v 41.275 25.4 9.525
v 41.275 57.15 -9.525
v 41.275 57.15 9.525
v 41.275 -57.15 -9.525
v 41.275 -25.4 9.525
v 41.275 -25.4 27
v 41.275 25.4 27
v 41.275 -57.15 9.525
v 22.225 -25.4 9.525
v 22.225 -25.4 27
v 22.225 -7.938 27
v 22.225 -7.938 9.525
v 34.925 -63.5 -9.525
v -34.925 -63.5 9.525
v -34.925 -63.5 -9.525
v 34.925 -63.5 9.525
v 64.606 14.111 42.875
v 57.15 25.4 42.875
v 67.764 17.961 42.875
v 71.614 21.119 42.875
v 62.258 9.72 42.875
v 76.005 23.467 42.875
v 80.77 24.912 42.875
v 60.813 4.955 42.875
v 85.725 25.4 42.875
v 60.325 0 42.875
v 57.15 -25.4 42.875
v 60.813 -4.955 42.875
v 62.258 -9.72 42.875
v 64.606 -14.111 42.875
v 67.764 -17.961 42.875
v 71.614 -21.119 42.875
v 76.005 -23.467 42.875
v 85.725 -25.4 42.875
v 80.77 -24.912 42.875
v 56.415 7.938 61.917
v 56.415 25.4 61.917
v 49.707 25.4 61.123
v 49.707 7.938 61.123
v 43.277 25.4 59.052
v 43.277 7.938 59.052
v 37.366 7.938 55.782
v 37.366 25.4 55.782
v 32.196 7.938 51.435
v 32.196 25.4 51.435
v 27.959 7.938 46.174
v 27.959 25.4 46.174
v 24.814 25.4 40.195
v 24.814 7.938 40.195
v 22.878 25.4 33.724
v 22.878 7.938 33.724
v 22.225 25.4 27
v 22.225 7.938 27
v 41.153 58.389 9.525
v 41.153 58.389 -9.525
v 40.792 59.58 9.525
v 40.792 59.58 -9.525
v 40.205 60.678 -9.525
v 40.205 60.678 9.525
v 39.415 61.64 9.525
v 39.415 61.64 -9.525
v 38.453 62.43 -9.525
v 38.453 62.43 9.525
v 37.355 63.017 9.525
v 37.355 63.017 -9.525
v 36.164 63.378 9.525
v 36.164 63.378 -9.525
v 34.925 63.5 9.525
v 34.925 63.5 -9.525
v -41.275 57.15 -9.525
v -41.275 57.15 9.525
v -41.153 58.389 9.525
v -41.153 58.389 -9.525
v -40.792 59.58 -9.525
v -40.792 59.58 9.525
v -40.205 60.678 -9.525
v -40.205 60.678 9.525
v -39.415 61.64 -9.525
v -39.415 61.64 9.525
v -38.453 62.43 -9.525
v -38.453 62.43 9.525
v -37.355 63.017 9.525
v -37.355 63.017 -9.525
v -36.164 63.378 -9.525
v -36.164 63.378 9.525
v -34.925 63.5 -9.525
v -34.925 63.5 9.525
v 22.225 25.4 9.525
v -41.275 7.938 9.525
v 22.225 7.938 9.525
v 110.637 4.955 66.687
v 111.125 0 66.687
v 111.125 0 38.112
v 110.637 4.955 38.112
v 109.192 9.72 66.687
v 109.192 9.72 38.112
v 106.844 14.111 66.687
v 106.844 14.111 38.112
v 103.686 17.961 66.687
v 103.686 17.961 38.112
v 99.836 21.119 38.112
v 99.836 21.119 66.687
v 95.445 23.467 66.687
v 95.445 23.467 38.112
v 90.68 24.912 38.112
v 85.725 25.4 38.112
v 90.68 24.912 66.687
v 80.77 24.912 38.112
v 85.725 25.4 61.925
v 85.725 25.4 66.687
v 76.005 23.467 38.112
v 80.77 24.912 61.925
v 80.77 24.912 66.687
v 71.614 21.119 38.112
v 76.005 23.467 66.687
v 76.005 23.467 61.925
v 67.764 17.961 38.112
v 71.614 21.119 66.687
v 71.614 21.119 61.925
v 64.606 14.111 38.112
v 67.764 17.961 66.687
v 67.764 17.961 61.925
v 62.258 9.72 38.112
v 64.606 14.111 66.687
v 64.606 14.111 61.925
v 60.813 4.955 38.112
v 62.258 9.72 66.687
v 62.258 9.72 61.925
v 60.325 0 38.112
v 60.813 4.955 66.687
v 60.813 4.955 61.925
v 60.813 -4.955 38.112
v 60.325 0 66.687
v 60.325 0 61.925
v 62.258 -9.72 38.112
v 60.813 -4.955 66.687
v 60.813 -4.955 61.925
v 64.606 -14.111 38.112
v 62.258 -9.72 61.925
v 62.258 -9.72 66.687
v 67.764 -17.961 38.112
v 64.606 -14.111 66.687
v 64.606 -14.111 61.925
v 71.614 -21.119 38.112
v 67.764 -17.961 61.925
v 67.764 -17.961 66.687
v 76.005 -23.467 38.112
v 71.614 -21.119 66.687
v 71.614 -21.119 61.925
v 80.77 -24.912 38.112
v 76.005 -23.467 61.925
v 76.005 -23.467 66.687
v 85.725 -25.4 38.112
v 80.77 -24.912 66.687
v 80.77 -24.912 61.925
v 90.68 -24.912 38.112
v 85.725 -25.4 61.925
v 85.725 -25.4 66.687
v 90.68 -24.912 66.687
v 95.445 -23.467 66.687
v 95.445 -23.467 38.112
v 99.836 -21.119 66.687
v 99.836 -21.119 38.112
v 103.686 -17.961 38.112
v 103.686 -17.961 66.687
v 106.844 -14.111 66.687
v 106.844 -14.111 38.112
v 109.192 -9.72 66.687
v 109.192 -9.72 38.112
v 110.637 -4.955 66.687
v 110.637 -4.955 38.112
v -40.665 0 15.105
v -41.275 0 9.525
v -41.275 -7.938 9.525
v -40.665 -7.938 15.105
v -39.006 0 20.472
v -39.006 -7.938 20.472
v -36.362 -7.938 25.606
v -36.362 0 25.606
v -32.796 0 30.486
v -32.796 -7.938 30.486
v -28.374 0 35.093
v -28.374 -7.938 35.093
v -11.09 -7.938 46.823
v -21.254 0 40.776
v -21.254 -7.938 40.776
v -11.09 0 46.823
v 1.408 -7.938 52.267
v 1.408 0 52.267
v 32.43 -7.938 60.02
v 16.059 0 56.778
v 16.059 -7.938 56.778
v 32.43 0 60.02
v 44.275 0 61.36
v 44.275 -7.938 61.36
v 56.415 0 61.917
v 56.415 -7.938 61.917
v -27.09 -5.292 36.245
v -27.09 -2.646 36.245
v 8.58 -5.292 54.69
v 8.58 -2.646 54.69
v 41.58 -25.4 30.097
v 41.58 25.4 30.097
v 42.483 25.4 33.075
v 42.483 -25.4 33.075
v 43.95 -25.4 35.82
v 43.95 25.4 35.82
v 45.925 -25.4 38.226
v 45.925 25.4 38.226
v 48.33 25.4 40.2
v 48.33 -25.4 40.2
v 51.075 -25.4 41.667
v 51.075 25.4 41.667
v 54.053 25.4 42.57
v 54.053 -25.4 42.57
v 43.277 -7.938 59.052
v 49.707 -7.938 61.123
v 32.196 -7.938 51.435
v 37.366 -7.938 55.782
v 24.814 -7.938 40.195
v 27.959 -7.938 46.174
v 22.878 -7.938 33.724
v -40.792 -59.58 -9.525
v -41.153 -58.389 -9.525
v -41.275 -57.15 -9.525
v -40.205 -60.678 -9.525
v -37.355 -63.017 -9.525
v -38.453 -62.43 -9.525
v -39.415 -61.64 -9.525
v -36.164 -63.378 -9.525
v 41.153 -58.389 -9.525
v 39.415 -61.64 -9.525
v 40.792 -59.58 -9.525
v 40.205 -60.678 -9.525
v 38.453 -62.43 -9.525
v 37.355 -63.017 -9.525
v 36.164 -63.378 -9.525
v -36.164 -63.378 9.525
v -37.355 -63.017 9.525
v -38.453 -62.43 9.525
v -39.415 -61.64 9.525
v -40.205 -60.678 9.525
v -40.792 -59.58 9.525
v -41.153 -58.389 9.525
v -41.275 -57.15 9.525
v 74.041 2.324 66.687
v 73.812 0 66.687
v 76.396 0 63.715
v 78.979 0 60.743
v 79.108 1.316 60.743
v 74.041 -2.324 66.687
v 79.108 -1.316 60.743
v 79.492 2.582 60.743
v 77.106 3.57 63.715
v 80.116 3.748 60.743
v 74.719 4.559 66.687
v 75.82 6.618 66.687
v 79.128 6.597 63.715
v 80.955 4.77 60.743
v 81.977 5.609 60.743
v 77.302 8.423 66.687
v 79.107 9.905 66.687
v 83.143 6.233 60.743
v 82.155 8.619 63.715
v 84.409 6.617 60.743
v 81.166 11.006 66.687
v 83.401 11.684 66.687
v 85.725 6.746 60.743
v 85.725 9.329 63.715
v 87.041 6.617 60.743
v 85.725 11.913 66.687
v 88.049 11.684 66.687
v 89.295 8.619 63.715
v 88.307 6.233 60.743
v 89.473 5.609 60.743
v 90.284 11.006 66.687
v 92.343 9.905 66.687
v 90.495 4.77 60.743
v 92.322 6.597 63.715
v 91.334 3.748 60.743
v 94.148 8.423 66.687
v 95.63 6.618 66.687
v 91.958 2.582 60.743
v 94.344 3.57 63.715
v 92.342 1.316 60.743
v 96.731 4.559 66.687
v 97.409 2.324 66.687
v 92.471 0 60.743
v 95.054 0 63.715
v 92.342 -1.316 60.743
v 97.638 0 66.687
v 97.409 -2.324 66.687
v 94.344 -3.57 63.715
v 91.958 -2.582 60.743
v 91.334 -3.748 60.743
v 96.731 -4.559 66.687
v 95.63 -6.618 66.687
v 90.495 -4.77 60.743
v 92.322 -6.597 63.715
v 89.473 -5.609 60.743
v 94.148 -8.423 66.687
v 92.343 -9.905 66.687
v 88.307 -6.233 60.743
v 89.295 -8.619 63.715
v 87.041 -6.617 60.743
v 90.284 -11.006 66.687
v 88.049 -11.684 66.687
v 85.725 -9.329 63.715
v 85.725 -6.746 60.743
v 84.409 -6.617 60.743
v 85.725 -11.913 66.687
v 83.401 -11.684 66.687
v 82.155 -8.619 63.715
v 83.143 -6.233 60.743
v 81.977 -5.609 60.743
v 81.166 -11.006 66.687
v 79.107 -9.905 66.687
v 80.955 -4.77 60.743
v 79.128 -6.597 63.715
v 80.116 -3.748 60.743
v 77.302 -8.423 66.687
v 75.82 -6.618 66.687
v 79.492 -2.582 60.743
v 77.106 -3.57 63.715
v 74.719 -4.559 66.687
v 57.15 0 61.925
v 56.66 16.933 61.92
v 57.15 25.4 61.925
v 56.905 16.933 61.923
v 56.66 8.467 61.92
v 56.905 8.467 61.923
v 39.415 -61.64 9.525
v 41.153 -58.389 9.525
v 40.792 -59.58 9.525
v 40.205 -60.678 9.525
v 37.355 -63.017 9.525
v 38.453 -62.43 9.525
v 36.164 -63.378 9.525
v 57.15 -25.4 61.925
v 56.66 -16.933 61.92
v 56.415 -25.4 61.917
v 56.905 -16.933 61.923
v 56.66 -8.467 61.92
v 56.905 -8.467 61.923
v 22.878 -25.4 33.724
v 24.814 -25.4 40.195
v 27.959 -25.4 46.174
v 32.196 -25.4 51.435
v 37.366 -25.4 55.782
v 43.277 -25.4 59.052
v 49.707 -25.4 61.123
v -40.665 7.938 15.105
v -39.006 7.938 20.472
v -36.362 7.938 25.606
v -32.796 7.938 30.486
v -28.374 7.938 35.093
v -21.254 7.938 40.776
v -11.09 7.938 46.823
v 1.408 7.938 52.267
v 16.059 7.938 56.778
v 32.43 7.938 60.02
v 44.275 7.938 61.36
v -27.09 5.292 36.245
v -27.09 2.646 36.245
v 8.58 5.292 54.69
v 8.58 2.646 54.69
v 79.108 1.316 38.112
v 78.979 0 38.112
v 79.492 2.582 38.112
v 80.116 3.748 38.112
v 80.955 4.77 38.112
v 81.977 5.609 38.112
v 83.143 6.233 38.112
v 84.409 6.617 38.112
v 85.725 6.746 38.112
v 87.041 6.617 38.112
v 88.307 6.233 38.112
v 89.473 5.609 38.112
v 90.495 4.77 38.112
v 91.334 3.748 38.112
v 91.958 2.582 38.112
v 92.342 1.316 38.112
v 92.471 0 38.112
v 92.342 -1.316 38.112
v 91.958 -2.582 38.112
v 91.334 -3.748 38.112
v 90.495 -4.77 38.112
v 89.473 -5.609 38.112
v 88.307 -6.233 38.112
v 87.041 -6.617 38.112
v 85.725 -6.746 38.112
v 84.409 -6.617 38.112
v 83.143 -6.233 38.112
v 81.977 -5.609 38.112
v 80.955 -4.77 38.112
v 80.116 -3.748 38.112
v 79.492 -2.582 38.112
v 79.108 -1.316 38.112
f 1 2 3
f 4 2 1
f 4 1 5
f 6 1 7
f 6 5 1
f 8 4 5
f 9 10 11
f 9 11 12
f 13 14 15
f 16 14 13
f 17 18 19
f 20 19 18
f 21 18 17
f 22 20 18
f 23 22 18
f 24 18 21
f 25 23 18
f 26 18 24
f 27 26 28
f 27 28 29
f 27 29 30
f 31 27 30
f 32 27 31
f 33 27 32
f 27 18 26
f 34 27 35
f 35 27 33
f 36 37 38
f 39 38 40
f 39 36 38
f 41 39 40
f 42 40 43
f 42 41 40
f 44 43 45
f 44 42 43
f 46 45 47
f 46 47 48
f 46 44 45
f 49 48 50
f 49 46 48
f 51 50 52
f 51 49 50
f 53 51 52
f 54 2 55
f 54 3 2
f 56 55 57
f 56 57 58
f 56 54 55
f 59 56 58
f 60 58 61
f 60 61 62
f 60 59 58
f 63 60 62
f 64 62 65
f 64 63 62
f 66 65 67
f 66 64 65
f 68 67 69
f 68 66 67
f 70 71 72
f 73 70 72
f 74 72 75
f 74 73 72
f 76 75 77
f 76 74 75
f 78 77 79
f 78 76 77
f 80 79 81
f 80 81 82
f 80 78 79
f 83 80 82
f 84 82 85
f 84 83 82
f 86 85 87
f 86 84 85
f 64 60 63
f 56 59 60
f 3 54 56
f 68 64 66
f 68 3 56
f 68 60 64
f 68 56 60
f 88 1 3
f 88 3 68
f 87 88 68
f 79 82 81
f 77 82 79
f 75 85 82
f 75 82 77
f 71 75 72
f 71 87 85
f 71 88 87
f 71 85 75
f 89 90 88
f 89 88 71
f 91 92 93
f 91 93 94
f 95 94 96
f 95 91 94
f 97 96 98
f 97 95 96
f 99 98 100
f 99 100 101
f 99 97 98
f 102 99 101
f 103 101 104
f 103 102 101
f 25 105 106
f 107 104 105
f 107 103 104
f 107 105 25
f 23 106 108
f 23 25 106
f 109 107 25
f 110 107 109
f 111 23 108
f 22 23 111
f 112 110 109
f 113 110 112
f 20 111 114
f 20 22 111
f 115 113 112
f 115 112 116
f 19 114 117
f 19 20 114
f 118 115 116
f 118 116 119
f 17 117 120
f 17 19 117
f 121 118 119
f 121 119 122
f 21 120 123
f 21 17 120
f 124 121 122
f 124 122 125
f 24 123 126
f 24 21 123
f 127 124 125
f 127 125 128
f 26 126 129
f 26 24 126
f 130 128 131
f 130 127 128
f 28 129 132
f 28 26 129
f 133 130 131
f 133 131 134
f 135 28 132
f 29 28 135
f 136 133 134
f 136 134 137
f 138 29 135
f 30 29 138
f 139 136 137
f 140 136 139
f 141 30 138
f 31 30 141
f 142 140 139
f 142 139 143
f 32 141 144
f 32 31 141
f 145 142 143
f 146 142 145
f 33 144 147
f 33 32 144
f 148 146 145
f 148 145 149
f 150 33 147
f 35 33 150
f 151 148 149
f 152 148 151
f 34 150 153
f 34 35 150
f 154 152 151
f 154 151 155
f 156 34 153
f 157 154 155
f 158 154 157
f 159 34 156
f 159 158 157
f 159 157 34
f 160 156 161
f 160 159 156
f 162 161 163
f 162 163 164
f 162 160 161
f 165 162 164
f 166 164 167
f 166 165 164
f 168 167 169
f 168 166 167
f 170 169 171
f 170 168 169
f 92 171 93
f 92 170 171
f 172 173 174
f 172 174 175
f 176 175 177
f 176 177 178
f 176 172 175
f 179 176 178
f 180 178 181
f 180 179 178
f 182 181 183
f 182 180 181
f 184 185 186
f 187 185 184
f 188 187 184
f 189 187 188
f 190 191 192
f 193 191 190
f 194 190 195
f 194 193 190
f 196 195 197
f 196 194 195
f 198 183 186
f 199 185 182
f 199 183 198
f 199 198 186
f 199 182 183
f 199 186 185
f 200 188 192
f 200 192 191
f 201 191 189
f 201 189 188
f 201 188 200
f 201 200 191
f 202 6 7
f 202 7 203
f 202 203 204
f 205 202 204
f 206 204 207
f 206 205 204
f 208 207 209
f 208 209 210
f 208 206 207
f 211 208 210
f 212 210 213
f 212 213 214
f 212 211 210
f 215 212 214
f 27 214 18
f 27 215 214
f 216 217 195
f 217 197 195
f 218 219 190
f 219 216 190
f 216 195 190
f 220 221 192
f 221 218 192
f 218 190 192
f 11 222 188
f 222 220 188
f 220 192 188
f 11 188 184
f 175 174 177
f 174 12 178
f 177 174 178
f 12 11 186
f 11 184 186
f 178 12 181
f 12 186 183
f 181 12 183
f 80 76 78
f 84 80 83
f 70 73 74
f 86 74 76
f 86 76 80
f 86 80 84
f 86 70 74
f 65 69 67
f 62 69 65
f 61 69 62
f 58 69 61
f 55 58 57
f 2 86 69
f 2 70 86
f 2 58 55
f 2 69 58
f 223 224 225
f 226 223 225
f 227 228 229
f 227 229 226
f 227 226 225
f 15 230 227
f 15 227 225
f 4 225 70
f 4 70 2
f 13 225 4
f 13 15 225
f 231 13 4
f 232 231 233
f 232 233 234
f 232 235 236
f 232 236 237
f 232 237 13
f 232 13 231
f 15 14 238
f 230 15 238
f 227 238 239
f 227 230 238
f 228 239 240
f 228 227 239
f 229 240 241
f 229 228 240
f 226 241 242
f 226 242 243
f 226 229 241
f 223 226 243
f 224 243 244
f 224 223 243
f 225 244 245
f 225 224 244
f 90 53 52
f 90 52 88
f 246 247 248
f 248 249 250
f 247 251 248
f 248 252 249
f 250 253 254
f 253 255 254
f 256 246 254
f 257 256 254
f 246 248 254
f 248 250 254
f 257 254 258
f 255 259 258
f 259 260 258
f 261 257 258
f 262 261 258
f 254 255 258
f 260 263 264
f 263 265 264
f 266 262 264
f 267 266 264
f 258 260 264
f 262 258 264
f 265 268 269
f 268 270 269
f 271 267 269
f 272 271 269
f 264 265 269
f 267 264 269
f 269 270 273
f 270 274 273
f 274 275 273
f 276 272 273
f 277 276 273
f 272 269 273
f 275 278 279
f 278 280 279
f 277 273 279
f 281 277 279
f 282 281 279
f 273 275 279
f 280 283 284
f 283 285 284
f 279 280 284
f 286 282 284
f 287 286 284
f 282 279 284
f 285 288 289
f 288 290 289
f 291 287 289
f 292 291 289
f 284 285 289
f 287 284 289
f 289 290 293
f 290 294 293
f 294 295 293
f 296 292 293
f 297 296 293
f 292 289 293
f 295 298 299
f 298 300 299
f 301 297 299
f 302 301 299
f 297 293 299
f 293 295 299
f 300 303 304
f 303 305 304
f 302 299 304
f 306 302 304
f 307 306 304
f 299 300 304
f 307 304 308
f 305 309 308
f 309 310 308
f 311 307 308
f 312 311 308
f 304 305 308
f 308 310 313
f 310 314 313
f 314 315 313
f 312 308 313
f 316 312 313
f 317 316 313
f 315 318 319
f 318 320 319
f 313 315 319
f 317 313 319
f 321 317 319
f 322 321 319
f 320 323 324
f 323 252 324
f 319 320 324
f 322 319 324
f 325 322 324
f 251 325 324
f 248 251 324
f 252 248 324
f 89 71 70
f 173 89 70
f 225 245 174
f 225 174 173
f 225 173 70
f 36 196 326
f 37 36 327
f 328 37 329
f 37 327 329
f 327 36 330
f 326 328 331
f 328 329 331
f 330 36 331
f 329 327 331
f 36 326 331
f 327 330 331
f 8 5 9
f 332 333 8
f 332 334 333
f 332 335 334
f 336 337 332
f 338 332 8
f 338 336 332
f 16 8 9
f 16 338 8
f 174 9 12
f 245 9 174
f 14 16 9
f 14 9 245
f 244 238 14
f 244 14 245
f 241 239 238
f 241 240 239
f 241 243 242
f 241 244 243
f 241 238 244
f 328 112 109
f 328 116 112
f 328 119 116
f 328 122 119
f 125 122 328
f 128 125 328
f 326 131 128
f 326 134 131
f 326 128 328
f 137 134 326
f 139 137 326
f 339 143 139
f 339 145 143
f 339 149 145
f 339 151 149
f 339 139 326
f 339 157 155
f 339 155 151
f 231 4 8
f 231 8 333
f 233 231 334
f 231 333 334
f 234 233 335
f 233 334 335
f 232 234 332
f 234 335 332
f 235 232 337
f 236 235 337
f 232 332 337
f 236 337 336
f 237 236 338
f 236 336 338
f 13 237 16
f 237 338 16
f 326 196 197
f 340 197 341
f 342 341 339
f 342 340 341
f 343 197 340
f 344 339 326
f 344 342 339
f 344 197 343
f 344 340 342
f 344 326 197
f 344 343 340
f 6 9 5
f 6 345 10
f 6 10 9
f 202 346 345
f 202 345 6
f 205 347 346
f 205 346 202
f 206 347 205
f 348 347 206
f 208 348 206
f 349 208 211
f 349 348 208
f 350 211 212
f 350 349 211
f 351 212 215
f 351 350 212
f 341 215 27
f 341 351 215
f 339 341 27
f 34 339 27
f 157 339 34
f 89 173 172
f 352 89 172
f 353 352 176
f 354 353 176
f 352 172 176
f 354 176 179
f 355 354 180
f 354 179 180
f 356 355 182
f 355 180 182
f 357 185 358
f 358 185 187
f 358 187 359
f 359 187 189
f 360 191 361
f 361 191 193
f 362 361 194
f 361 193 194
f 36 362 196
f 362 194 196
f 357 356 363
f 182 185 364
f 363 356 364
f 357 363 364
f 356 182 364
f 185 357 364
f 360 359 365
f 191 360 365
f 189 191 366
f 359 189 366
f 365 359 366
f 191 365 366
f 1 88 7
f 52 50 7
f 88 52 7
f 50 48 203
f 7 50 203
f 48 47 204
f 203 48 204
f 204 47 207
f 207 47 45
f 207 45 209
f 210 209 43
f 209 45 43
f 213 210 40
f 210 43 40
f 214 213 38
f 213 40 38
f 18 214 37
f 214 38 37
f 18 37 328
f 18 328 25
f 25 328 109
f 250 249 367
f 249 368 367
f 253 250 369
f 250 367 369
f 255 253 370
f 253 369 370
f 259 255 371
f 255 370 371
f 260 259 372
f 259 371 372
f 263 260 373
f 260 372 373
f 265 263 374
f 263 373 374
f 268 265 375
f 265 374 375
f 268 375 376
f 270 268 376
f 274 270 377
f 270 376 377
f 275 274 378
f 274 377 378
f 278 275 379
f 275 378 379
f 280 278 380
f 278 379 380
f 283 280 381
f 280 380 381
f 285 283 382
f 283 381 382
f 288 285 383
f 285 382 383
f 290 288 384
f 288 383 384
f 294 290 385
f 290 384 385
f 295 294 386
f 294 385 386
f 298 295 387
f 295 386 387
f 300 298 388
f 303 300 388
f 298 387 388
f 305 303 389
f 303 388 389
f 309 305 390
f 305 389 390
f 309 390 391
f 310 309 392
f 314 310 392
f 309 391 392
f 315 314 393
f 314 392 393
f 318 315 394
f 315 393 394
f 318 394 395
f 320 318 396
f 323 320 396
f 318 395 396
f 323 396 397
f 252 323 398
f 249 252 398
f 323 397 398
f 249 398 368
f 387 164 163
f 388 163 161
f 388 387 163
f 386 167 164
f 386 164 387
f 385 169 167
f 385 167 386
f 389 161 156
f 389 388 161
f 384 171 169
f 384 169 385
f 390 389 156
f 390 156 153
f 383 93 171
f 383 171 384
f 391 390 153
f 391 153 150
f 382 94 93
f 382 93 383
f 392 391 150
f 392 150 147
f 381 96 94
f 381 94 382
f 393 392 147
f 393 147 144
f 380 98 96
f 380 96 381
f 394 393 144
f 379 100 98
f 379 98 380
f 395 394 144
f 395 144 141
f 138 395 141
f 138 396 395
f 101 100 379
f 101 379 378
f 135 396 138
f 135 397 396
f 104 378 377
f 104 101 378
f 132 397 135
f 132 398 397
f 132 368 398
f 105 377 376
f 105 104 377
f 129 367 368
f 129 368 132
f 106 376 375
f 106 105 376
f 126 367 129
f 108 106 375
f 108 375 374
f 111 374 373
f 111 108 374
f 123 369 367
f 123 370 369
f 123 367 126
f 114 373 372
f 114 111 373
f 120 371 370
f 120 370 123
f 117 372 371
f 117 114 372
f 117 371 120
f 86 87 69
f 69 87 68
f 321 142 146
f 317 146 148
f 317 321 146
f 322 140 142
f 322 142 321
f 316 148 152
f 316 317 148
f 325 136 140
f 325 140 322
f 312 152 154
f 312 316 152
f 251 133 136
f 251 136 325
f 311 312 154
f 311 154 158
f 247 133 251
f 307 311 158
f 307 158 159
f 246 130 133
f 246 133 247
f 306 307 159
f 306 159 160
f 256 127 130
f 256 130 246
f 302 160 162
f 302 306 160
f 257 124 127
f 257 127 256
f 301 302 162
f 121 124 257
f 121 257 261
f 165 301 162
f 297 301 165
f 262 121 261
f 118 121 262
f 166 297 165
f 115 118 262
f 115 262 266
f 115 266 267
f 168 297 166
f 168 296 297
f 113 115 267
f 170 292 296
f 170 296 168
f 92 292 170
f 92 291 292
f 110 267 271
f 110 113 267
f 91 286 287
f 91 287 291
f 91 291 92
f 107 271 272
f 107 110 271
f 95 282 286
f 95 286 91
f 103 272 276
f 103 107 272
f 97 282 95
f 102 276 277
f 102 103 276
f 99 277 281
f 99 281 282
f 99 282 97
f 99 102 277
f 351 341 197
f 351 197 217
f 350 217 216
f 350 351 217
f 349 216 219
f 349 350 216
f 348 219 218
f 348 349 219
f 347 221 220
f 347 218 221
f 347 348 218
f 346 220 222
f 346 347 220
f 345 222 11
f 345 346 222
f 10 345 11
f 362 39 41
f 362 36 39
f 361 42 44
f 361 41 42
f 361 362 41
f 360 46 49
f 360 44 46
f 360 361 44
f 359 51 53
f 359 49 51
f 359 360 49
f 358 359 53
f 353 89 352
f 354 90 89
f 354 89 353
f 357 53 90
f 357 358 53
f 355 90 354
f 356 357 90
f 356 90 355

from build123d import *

# Parameters (mm, degrees)
F1_DEPTH       = 63.5
F0_W           = 25.4
F0_H           = 19.05
F2_DEPTH       = 25.4
F3_DEPTH       = 7.9375
F5_R           = 6.35
F7_D           = 13.49248
F7_CSINK_D     = 23.8252
F7_CSINK_ANGLE = 82


with BuildPart() as f1:
    # F0 (on Front) → F1 (new body, symmetric)
    with BuildSketch(Plane.XZ):
        Polygon((-41.275, 9.525), (-41.275, -9.525), (41.275, -9.525), (41.275, 9.525), (22.225, 9.525), align=None)
    extrude(amount=F1_DEPTH, both=True)

    # F0 (on Front) → F2 (join, symmetric)
    with BuildSketch(Plane.XZ):
        with BuildLine():
            Line((22.225, 9.525), (41.275, 9.525))
            Line((41.275, 9.525), (41.275, 27.0002))
            ThreePointArc((41.275, 27.0002), (45.9246798487, 38.2255201513), (57.15, 42.8752))
            Line((57.15, 42.8752), (60.325, 42.8752))
            Line((60.325, 42.8752), (60.325, 61.9252))
            Line((60.325, 61.9252), (57.15, 61.9252))
            add(Edge.make_bspline(
                [(56.4151043372, 61.9174672666), (56.659972062, 61.9205386908), (56.9049388479, 61.9231167628), (57.15, 61.9252)],
                knots=[110.9697423525, 110.9697423525, 110.9697423525, 110.9697423525, 111.5045361635, 111.5045361635, 111.5045361635, 111.5045361635], degree=3))
            ThreePointArc((56.4151043372, 61.9174672666), (32.1958234355, 51.4346980916), (22.225, 27.0002))
            Line((22.225, 27.0002), (22.225, 9.525))
        make_face()
        with Locations((73.025, 52.4002)):
            Rectangle(F0_W, F0_H)
    extrude(amount=F2_DEPTH, both=True)

    # F0 (on Front) → F3 (join, symmetric)
    with BuildSketch(Plane.XZ):
        with BuildLine():
            add(Edge.make_bspline(
                [(-41.275, 9.525), (-40.9398250429, 39.4009187199), (5.6050392748, 61.2801465881), (56.4151043372, 61.9174672666)],
                knots=[0, 0, 0, 0, 110.9697423525, 110.9697423525, 110.9697423525, 110.9697423525], degree=3))
            Line((-41.275, 9.525), (22.225, 9.525))
            Line((22.225, 9.525), (22.225, 27.0002))
            ThreePointArc((22.225, 27.0002), (32.1958234355, 51.4346980916), (56.4151043372, 61.9174672666))
        make_face()
    extrude(amount=F3_DEPTH, both=True)

    # F0 (on Front) → F4 (revolve)
    with BuildSketch(Plane.XZ):
        Polygon((85.725, 66.6865812632), (85.725, 61.9252), (85.725, 42.8752), (85.725, 38.1115812632), (111.125, 38.1115812632), (111.125, 66.6865812632), align=None)
    revolve(axis=Axis((85.725, 0, 52.3990812632), (0, 0, 1)))

    # F5
    f5_edges = [f1.edges().sort_by_distance(p)[0] for p in [
        (-41.275, -63.5, 0),
        (41.275, -63.5, 0),
        (41.275, 63.5, 0),
        (-41.275, 63.5, 0),
    ]]
    fillet(f5_edges, radius=F5_R)

    # F7 (through all)
    with Locations(Plane.XY.offset(66.6865812632)):
        with Locations((85.725, 0)):
            CounterSinkHole(F7_D / 2, F7_CSINK_D / 2, counter_sink_angle=F7_CSINK_ANGLE)


solid = f1.part
